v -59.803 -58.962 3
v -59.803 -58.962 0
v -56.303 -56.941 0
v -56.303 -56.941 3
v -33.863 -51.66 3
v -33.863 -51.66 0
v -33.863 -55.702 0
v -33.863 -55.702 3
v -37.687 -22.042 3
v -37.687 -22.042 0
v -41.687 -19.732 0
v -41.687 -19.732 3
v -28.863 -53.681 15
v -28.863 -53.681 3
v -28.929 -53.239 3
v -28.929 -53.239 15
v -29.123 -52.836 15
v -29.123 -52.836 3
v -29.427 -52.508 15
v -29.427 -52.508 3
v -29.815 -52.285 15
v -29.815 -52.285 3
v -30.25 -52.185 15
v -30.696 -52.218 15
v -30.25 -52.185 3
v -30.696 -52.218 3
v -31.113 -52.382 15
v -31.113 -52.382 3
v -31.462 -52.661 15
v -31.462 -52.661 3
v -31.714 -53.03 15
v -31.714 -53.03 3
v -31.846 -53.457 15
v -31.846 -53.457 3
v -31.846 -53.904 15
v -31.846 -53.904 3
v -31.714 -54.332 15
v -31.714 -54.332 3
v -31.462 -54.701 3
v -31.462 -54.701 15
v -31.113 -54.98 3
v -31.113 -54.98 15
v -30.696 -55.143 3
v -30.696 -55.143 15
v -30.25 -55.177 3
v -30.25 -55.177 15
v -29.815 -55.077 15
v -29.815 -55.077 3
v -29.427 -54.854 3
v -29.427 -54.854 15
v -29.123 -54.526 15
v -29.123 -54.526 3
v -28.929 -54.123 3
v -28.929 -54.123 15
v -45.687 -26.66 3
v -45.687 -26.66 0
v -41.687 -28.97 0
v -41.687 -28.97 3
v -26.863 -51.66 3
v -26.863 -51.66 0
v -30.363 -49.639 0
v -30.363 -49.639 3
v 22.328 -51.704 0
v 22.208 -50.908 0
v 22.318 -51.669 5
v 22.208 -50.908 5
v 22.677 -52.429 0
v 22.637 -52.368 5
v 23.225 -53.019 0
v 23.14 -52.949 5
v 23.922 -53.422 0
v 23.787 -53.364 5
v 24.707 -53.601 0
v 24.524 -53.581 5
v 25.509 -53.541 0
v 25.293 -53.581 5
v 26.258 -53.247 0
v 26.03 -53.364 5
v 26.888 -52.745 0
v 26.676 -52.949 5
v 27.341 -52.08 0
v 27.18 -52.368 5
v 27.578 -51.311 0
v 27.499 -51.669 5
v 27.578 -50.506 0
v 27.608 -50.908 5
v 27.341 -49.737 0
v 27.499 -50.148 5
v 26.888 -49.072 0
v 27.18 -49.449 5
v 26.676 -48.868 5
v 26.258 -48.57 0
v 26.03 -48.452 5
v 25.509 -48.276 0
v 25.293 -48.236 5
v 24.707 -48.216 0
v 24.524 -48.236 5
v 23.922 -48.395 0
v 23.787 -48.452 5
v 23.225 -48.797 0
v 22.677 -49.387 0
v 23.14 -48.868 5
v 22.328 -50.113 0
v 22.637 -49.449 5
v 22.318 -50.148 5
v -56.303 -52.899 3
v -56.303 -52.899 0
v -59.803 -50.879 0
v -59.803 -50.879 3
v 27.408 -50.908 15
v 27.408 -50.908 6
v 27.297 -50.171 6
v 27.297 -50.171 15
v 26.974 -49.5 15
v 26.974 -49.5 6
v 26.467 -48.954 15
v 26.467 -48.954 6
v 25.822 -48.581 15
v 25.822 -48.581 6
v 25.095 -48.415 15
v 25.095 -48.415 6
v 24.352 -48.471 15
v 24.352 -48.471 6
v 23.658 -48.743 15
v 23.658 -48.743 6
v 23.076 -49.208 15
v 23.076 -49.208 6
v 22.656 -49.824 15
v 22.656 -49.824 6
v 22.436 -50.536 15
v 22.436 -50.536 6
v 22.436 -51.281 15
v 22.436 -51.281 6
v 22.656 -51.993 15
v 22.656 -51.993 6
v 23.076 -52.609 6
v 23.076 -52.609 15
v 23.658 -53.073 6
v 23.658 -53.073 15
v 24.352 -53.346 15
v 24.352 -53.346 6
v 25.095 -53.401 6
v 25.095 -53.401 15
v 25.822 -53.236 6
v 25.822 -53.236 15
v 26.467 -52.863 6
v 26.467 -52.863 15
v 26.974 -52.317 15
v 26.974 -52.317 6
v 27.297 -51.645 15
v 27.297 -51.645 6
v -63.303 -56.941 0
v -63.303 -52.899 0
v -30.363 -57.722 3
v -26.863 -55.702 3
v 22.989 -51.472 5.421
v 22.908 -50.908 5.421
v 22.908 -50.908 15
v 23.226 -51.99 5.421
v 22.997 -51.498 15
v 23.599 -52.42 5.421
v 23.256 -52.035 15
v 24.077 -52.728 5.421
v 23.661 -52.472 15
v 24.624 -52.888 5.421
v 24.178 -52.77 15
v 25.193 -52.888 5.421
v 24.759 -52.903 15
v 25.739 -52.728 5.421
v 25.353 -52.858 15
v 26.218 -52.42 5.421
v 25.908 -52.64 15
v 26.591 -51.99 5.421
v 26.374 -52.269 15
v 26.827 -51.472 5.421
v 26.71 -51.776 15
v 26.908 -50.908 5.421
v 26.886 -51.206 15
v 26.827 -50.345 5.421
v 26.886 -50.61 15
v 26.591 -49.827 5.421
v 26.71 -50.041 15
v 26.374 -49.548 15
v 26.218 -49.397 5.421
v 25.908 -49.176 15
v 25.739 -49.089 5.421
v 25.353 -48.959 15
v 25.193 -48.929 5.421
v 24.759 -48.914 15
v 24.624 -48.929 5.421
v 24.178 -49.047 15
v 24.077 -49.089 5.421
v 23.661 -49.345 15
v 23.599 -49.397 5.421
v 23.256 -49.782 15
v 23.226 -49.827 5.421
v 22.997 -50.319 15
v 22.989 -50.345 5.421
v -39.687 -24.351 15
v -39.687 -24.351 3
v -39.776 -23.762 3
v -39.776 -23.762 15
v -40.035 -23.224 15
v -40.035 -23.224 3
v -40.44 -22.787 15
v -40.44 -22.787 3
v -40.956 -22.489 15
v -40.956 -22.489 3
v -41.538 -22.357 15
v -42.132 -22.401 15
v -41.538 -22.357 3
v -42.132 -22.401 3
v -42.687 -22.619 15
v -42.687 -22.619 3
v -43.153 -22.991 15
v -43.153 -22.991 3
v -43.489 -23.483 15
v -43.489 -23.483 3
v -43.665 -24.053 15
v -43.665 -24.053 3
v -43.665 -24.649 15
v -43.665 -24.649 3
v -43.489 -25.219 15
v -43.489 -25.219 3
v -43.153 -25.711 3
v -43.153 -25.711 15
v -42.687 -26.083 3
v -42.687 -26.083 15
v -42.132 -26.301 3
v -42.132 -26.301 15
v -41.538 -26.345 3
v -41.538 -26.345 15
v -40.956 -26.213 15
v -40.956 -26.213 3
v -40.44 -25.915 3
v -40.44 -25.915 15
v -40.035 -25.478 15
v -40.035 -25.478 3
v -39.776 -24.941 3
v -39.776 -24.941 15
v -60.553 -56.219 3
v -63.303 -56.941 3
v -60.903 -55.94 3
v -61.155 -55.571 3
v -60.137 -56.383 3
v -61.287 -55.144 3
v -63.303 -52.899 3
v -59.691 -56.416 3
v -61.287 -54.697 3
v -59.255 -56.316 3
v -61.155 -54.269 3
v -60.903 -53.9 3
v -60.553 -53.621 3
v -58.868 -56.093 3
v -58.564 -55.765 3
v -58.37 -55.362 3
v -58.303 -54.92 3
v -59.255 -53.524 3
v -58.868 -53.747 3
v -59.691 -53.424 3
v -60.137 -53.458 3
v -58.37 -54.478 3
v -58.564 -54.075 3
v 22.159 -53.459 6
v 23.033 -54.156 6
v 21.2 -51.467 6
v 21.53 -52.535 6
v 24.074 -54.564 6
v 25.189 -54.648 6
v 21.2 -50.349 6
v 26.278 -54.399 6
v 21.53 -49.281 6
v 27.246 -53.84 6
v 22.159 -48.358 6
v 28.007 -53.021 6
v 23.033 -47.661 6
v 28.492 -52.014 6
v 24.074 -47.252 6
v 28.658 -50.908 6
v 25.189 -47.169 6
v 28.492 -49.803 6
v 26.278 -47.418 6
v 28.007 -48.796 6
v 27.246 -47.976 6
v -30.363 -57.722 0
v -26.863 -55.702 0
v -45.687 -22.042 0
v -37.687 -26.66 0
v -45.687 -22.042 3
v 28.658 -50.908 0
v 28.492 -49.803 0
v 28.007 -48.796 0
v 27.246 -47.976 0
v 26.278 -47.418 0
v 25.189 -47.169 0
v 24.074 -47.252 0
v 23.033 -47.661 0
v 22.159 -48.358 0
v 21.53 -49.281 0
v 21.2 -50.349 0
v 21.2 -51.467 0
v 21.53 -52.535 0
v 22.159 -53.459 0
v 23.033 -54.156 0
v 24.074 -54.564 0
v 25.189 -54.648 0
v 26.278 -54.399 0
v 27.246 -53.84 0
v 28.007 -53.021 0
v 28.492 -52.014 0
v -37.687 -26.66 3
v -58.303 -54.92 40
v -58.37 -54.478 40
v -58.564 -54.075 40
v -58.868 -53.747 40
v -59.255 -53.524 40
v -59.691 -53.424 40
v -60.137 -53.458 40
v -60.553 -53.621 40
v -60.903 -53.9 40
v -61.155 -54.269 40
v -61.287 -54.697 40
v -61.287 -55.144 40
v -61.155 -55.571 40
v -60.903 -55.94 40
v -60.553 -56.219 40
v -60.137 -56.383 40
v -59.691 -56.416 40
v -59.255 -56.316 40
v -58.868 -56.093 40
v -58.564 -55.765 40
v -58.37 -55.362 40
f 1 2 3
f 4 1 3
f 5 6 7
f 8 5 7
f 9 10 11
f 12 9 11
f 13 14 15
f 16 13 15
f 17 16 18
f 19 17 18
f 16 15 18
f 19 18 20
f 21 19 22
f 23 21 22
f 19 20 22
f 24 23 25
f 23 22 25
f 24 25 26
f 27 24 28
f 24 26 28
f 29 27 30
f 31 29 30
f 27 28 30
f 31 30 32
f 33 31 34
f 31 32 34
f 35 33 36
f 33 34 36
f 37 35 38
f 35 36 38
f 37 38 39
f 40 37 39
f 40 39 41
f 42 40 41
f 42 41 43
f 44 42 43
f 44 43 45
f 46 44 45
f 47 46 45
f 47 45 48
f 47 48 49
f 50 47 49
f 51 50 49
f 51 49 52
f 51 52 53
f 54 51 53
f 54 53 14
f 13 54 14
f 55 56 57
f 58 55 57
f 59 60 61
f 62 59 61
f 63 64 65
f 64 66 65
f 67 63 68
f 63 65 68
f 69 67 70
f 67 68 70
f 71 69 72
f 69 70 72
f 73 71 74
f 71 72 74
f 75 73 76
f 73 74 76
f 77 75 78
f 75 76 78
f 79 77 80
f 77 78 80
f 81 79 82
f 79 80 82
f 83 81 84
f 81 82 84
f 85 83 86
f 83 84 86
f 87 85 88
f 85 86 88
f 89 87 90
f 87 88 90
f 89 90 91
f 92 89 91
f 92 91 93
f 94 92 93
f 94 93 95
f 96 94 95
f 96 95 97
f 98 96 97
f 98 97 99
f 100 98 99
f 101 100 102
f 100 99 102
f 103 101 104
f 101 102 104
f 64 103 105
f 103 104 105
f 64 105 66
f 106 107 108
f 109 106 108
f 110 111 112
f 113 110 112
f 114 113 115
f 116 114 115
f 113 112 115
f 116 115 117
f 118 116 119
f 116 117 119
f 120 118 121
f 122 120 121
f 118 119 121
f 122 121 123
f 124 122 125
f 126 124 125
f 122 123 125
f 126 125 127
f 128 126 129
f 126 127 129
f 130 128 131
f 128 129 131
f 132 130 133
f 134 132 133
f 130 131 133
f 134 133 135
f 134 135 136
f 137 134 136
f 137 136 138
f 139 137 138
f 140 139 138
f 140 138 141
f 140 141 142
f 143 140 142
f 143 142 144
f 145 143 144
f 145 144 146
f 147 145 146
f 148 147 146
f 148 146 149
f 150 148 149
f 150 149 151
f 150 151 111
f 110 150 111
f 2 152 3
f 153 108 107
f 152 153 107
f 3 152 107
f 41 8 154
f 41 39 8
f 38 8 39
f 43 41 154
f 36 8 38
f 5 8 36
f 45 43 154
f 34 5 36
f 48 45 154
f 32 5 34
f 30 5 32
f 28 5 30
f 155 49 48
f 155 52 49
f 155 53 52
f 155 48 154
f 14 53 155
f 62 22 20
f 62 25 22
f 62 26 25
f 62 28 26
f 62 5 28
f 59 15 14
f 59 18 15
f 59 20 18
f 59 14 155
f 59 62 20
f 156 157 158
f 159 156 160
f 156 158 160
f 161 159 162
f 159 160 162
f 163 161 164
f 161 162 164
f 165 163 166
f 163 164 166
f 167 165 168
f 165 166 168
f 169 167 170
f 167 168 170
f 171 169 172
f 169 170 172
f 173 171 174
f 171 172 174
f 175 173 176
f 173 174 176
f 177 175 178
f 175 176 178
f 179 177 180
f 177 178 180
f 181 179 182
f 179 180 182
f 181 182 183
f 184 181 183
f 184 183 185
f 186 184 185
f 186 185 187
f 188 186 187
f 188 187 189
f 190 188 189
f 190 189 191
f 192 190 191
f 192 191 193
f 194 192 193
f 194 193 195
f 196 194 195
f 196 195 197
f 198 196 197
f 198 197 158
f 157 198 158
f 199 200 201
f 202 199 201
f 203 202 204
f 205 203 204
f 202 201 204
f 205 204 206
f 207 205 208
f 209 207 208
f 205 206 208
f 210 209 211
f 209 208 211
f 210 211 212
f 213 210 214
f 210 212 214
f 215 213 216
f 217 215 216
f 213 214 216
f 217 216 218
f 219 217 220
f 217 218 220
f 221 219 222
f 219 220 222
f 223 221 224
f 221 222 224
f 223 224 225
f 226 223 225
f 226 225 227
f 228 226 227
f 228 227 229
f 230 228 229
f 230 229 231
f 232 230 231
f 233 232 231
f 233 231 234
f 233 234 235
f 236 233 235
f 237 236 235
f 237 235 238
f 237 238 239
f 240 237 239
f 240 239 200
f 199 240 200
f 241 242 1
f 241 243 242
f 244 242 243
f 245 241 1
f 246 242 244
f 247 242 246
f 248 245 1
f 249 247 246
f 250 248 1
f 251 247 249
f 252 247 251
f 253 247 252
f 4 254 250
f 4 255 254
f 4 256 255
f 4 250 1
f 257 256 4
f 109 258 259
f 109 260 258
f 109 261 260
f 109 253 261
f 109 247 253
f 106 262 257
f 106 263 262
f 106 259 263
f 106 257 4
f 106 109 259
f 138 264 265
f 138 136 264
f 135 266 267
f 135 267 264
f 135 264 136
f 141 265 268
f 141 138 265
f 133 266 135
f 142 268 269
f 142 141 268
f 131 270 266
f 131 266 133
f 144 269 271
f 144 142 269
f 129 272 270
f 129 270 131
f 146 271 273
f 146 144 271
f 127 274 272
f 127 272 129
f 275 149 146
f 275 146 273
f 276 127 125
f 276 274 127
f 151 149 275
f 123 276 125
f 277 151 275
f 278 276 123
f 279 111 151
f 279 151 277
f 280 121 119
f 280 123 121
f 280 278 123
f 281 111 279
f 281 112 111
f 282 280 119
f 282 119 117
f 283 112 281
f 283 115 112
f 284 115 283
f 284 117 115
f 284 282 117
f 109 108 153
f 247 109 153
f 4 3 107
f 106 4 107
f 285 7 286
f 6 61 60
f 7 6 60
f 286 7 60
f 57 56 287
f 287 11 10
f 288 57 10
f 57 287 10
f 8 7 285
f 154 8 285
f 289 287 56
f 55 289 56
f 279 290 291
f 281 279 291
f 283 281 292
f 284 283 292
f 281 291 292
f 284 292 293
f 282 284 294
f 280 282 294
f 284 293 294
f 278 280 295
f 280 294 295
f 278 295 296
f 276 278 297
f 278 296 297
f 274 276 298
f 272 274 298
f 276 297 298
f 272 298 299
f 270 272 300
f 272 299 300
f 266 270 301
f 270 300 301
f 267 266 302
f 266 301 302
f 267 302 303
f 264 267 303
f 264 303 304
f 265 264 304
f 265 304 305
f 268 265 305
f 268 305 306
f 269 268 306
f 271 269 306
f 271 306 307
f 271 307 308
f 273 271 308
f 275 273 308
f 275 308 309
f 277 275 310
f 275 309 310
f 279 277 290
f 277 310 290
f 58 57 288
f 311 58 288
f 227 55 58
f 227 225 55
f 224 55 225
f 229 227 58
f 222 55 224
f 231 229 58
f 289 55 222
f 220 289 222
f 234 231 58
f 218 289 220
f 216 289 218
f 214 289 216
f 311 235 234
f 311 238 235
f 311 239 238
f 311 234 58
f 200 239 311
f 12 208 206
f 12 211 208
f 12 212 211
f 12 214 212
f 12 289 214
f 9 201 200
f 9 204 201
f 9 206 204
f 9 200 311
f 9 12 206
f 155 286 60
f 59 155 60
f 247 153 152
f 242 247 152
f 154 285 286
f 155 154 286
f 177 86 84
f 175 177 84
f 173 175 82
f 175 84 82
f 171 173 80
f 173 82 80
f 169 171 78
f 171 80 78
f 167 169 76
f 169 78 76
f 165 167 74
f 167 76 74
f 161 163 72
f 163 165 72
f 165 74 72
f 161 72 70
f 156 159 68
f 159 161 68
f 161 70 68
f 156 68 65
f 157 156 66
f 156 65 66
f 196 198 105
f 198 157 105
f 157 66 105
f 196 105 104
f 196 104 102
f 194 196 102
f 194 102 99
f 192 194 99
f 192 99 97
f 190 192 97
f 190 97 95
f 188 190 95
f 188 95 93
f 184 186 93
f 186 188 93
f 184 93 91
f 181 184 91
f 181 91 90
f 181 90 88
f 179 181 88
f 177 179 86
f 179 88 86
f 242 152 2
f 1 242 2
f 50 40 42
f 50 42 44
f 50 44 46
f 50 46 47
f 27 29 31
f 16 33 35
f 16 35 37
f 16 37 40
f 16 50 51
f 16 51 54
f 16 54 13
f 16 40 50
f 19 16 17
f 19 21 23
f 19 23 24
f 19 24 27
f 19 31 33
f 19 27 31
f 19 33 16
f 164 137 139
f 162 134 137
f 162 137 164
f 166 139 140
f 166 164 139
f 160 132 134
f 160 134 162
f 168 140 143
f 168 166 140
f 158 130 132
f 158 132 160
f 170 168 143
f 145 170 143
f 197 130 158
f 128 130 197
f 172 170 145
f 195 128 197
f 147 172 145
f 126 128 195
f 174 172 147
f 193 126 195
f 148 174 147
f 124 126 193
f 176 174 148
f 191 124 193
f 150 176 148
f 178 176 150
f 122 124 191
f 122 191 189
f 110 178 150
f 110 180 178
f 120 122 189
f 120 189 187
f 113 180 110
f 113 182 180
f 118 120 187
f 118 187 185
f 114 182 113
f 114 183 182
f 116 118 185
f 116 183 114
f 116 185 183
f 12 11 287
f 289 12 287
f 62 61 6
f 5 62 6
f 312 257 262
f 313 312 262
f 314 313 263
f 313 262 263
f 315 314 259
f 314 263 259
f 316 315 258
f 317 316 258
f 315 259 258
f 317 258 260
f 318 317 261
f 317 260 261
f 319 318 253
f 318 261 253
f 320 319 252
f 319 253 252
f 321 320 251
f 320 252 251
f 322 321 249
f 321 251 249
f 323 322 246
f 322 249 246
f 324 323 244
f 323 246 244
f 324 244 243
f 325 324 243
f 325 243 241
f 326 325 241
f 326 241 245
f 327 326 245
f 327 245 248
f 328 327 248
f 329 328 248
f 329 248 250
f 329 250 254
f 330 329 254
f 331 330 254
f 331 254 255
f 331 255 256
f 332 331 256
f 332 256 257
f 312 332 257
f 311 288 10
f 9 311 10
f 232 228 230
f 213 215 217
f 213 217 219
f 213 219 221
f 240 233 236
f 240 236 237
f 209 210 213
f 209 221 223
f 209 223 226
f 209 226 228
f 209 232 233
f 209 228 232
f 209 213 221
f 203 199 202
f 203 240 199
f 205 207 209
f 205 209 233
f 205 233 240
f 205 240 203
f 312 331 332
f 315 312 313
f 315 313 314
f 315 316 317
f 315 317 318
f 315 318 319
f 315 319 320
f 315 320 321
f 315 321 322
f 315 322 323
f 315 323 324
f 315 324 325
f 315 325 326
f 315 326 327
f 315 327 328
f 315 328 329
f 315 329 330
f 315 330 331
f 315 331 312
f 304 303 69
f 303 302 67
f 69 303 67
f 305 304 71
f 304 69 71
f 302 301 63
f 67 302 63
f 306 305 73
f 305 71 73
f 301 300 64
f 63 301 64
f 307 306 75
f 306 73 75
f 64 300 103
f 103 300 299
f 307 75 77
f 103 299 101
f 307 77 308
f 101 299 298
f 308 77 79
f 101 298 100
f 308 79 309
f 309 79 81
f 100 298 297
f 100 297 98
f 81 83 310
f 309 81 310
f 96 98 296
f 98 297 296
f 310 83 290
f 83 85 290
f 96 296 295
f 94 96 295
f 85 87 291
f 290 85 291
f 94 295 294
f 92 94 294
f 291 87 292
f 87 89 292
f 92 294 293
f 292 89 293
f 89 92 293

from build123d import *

# Parameters (mm, degrees)
F0_R     = 1.5
F1_DEPTH = 3
F0_R_2   = 2
F2_DEPTH = 40
F3_DEPTH = 15
F4_R     = 3.75
F4_R_2   = 2.5
F5_DEPTH = 6
F6_DEPTH = 15
F7_D     = 5.4
F7_DEPTH = 5
F7_TIP   = 1.6223236714
F8_D     = 4
F8_DEPTH = 15
F8_START = 5.4206024
F8_TIP   = 1.2017212381


with BuildPart() as f1:
    # F0 (on Top) → F1 (new body)
    with BuildSketch(Plane.XY):
        Polygon((-56.303340584, -56.9408367937), (-56.303340584, -52.8993849094), (-59.803340584, -50.8786589672), (-63.303340584, -52.8993849094), (-63.303340584, -56.9408367937), (-59.803340584, -58.9615627359), align=None)
        with Locations((-59.803340584, -54.9201108515)):
            Circle(F0_R, mode=Mode.SUBTRACT)
    extrude(amount=F1_DEPTH)

    # F0 (on Top) → F2 (join)
    with BuildSketch(Plane.XY):
        with Locations((-59.803340584, -54.9201108515)):
            Circle(F0_R)
    extrude(amount=F2_DEPTH)


with BuildPart() as f1b:
    # F0 (on Top) → F1, piece 2 (new body)
    with BuildSketch(Plane.XY):
        Polygon((-26.8625445813, -55.7015779977), (-26.8625445813, -51.6601261134), (-30.3625445813, -49.6394001712), (-33.8625445813, -51.6601261134), (-33.8625445813, -55.7015779977), (-30.3625445813, -57.7223039399), align=None)
        with Locations((-30.3625445813, -53.6808520555)):
            Circle(F0_R, mode=Mode.SUBTRACT)
    extrude(amount=F1_DEPTH)

    # F0 (on Top) → F3 (join)
    with BuildSketch(Plane.XY):
        with Locations((-30.3625445813, -53.6808520555)):
            Circle(F0_R)
    extrude(amount=F3_DEPTH)


with BuildPart() as f1c:
    # F0 (on Top) → F1, piece 3 (new body)
    with BuildSketch(Plane.XY):
        Polygon((-37.6870862246, -26.6604223517), (-37.6870862246, -22.0416201982), (-41.6870862246, -19.7322191214), (-45.6870862246, -22.0416201982), (-45.6870862246, -26.6604223517), (-41.6870862246, -28.9698234284), align=None)
        with Locations((-41.6870862246, -24.3510212749)):
            Circle(F0_R_2, mode=Mode.SUBTRACT)
    extrude(amount=F1_DEPTH)

    # F0 (on Top) → F3, piece 2 (join)
    with BuildSketch(Plane.XY):
        with Locations((-41.6870862246, -24.3510212749)):
            Circle(F0_R_2)
    extrude(amount=F3_DEPTH)


with BuildPart() as f5:
    # F4 (on Top) → F5 (new body)
    with BuildSketch(Plane.XY):
        with Locations((24.9082874507, -50.9083606303)):
            Circle(F4_R)
        with Locations((24.9082874507, -50.9083606303)):
            Circle(F4_R_2, mode=Mode.SUBTRACT)
    extrude(amount=F5_DEPTH)

    # F4 (on Top) → F6 (join)
    with BuildSketch(Plane.XY):
        with Locations((24.9082874507, -50.9083606303)):
            Circle(F4_R_2)
    extrude(amount=F6_DEPTH)

    # F7
    with Locations(Plane(origin=(0, 0, 0), x_dir=(1, 0, 0), z_dir=(0, 0, -1))):
        with Locations((24.9082874507, 50.9083606303)):
            Hole(F7_D / 2, depth=F7_DEPTH)
            with Locations((0, 0, -(F7_DEPTH + F7_TIP / 2))):  # 118° drill point
                Cone(0, F7_D / 2, F7_TIP, mode=Mode.SUBTRACT)

    # F8
    # its depths count from where the whole tool has entered the part; down to there all is cleared
    with Locations(Plane(origin=(0, 0, 0), x_dir=(1, 0, 0), z_dir=(0, 0, -1)).offset(-F8_START)):
        with Locations((24.9082874507, 50.9083606303)):
            Hole(F8_D / 2, depth=F8_DEPTH)
            with Locations((0, 0, -(F8_DEPTH + F8_TIP / 2))):  # 118° drill point
                Cone(0, F8_D / 2, F8_TIP, mode=Mode.SUBTRACT)


solid = Compound([f1.part, f1b.part, f1c.part, f5.part])
